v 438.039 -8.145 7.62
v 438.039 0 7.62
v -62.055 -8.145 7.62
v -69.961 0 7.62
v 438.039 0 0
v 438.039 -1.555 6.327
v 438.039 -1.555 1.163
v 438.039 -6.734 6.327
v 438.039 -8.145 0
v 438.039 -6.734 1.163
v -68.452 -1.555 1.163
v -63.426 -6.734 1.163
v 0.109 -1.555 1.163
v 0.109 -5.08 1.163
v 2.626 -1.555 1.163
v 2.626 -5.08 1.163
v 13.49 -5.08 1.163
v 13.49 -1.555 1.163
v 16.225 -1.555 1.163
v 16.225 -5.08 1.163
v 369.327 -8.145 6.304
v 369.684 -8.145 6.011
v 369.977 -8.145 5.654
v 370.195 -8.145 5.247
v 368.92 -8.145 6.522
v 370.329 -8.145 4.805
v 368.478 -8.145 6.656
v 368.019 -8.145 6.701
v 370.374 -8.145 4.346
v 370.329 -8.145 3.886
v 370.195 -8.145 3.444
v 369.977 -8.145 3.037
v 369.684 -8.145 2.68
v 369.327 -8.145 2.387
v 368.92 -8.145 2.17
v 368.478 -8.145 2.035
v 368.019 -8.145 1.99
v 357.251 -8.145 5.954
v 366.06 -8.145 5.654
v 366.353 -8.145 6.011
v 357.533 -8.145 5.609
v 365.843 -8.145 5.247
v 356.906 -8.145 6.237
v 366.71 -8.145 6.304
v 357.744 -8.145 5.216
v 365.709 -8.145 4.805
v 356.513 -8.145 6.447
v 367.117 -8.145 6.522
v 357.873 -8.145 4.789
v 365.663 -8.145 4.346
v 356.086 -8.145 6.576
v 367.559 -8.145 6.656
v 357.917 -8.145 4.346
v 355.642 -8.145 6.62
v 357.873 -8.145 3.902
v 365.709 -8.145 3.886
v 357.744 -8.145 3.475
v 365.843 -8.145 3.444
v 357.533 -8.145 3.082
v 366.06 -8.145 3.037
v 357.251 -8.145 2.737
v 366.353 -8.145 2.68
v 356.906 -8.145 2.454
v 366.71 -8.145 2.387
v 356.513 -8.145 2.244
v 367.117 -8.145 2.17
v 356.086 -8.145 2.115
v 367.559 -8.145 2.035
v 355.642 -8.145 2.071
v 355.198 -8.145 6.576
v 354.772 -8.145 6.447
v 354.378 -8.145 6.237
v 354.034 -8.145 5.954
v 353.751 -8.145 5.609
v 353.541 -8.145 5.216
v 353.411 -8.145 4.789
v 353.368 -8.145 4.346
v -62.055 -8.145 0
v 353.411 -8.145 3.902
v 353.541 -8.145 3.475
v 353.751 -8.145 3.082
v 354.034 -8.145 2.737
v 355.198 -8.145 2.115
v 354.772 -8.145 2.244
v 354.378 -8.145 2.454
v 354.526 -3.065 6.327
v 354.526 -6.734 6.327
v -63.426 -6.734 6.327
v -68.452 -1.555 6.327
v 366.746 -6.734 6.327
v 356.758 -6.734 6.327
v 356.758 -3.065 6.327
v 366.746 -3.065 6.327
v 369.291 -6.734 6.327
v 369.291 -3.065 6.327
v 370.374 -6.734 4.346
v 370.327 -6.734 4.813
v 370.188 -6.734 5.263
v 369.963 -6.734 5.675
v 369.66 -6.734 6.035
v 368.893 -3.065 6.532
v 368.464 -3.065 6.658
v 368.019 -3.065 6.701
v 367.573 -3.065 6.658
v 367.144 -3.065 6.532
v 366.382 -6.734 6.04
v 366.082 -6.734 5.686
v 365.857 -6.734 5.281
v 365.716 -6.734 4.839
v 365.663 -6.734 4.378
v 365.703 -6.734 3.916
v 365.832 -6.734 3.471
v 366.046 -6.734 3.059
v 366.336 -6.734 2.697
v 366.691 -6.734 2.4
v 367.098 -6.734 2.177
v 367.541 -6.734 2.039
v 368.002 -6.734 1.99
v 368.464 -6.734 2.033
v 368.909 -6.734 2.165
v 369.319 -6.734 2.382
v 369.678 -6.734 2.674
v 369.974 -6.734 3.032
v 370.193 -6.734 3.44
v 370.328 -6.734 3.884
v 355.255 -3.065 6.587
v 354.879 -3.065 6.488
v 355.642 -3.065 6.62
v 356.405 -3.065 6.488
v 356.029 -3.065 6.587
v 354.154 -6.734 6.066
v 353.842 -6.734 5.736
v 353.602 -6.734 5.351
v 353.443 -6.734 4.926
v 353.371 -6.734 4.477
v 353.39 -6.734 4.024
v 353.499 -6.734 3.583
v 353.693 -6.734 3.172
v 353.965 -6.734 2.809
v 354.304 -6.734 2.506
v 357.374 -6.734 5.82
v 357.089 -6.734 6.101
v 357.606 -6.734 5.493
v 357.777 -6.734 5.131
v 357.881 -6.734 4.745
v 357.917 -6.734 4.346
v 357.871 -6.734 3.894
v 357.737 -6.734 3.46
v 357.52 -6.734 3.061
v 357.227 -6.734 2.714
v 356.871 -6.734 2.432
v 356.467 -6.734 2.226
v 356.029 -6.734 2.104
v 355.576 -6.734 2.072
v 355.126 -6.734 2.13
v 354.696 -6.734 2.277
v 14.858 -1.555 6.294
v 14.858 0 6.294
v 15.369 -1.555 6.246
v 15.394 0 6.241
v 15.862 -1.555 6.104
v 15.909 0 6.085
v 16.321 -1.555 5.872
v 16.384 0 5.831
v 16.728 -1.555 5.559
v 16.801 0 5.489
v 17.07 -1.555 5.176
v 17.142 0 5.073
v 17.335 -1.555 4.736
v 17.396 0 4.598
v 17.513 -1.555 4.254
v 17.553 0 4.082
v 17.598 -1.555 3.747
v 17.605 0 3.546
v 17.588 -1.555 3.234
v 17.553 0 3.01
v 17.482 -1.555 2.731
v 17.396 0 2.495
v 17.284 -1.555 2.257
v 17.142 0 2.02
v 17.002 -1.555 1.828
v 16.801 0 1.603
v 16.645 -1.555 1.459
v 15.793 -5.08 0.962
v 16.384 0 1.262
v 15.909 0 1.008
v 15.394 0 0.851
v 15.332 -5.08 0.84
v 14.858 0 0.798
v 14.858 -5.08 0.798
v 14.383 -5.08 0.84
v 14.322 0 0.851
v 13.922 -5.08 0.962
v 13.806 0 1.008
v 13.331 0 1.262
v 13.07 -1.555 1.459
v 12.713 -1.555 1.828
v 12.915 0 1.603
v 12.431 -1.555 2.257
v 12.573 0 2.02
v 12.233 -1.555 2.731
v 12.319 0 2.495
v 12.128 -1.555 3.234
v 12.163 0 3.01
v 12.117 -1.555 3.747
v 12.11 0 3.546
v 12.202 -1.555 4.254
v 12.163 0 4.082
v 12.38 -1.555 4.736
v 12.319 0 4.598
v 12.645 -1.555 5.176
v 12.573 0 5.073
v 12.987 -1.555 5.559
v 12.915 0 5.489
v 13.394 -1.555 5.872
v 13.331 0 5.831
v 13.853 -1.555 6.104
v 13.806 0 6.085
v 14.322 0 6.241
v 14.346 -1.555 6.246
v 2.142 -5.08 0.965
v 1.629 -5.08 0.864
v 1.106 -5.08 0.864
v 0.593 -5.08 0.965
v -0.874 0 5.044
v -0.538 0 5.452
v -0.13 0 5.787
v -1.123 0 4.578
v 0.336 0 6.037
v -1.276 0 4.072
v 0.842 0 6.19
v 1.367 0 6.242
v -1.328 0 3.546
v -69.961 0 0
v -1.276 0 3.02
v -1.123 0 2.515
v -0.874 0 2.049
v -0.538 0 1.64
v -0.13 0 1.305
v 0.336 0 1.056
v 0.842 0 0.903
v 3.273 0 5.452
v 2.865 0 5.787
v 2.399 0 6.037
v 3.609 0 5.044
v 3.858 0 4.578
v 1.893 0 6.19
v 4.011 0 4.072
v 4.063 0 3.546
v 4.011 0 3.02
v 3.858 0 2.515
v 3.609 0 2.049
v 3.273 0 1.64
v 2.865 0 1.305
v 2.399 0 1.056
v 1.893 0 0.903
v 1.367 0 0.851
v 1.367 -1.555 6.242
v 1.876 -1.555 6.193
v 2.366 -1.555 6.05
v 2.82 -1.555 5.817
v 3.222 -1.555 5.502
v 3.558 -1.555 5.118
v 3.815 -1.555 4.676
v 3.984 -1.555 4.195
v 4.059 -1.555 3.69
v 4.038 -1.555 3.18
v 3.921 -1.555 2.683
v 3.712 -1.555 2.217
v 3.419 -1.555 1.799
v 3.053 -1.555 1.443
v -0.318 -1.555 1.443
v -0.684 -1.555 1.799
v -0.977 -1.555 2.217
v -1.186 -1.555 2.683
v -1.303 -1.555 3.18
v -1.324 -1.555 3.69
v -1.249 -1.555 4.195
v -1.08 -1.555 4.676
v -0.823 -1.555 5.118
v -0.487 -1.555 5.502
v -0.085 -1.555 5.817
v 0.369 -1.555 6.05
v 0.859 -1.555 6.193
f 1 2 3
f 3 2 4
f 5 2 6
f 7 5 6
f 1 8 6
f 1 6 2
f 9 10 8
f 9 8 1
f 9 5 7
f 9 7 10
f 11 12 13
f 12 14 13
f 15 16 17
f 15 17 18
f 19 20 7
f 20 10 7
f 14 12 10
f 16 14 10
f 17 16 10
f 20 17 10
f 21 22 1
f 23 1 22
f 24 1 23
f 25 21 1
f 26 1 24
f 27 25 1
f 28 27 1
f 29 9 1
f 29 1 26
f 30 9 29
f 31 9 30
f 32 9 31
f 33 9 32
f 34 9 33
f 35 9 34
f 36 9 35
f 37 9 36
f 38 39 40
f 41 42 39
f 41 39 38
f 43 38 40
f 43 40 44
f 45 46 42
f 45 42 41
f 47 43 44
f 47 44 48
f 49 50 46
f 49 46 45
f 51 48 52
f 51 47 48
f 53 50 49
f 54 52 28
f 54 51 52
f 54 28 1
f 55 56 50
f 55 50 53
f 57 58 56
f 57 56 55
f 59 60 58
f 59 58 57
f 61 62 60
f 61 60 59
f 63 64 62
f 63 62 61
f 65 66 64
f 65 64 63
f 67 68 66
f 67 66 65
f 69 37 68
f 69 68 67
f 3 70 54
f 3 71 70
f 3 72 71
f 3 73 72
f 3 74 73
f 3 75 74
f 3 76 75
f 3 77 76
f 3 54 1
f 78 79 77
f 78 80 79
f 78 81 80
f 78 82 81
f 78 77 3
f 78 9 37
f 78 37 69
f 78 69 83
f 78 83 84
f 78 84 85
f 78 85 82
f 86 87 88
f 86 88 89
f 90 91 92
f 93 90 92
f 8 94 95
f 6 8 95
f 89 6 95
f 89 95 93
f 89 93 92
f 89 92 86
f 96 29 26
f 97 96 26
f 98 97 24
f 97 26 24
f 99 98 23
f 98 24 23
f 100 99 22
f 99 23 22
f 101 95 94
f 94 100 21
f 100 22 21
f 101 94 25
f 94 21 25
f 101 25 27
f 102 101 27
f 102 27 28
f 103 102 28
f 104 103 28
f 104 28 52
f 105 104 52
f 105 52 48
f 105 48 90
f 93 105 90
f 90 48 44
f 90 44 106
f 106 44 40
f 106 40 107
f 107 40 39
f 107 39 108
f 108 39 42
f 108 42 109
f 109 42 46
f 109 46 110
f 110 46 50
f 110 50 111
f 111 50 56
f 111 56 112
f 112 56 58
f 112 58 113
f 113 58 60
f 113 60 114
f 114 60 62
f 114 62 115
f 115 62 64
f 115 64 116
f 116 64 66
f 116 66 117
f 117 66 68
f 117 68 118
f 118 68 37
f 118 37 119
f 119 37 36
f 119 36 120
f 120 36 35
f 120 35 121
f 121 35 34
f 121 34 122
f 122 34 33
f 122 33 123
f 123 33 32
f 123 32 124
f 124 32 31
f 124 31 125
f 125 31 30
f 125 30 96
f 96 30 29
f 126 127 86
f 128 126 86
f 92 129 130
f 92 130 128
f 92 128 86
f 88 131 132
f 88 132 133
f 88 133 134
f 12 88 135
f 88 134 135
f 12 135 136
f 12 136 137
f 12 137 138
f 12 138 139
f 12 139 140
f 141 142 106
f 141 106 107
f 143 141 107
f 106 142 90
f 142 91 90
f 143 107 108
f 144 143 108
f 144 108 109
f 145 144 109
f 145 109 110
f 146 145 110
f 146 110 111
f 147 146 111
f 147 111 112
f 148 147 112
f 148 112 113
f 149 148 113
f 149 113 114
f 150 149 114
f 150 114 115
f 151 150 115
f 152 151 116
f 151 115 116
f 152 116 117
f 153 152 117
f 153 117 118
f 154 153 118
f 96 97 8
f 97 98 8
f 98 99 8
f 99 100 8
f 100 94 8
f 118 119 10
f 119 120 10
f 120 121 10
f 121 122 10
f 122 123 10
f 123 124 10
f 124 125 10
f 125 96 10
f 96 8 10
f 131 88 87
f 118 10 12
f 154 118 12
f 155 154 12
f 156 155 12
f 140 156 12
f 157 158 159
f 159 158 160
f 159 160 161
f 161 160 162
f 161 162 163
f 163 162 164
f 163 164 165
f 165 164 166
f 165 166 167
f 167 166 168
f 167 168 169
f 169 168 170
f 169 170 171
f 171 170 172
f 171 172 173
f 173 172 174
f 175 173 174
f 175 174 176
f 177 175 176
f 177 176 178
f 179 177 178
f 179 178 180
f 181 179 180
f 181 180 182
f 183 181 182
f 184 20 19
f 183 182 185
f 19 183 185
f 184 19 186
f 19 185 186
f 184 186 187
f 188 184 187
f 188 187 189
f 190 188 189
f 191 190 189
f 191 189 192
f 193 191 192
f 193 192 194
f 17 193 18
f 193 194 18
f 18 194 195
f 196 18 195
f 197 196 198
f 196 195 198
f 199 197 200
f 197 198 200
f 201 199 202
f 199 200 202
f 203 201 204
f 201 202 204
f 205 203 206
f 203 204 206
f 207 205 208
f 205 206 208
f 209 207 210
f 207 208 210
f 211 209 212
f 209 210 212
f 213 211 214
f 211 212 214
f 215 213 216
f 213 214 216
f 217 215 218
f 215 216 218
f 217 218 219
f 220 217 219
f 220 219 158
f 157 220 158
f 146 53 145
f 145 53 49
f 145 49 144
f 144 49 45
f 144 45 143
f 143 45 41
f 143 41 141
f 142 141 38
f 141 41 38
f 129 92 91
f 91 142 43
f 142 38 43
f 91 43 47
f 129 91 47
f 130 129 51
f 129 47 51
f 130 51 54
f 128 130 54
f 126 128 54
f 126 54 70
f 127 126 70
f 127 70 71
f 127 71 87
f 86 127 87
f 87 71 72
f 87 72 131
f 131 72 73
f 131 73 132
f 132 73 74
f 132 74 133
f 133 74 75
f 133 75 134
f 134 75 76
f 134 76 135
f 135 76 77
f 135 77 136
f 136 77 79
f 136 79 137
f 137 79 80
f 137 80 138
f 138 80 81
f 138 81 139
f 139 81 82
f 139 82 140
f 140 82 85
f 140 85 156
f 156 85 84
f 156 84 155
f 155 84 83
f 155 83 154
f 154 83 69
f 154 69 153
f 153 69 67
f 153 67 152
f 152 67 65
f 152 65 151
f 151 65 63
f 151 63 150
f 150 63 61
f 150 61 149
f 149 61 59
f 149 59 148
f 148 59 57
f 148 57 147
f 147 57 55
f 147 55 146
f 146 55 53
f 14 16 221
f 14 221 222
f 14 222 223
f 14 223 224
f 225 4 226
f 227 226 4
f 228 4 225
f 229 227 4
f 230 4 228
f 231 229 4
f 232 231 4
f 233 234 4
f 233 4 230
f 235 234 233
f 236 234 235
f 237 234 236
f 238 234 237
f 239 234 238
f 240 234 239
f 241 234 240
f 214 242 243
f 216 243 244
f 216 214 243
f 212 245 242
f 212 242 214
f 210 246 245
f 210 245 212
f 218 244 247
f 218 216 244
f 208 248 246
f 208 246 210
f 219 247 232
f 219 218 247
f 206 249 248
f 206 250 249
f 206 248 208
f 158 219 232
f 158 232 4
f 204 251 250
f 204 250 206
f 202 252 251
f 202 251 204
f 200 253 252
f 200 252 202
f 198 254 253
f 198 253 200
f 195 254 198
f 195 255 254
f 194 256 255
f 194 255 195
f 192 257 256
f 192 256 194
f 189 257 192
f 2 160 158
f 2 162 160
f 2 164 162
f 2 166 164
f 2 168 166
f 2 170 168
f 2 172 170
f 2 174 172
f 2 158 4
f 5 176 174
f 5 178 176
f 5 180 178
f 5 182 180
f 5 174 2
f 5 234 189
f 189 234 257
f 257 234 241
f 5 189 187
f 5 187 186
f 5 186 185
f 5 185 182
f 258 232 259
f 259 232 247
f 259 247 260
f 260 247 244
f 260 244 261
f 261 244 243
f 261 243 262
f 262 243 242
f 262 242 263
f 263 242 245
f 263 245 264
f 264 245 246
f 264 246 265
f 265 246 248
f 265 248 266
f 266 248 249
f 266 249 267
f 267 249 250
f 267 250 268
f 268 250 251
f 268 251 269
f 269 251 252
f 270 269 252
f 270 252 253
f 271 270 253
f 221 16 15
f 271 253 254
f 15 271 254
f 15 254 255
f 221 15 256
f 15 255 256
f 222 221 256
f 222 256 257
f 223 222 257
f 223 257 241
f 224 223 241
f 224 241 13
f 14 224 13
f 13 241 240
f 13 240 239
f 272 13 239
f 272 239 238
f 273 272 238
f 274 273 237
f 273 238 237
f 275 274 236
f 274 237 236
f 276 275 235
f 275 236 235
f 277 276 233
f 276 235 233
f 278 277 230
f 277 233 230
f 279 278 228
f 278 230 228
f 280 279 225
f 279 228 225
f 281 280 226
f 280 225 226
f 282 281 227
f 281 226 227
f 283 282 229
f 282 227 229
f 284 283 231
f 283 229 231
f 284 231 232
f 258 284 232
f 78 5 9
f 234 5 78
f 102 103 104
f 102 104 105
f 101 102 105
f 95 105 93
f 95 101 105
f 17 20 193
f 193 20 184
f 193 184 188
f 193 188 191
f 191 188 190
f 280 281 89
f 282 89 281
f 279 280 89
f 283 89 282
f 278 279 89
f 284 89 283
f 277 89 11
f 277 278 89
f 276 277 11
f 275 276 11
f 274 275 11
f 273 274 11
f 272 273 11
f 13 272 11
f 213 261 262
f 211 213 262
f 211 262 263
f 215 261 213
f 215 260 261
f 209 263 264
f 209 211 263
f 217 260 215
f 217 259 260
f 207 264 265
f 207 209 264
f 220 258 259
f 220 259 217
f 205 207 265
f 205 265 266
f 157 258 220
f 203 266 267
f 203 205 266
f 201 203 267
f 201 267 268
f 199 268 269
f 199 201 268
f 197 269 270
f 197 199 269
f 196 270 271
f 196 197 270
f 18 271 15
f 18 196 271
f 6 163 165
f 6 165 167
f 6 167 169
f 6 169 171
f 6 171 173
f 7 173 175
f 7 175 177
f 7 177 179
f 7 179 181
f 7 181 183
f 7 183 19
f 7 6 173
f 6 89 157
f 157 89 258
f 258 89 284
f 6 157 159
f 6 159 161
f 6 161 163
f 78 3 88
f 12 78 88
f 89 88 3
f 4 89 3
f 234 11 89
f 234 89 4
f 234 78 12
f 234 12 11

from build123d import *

# Parameters (mm, degrees)
BOSS_EXTRUDE1_DEPTH = 7.62
SKETCH3_W           = 5.16456173
SKETCH3_H           = 5.178482382
CUT_EXTRUDE2_DEPTH  = 509.122439065
SKETCH4_R           = 2.695407271
SKETCH4_R_2         = 2.747845639
CUT_EXTRUDE3_DEPTH  = 5.08
SKETCH5_R           = 2.274624141
SKETCH5_R_2         = 2.355331531
CUT_EXTRUDE4_DEPTH  = 5.08


with BuildPart() as part:
    # Sketch1 → Boss-Extrude1 (new body)
    with BuildSketch(Plane.XY):
        Polygon((-69.961161881, 0), (438.038838119, 0), (438.038838119, -8.14546996), (-62.055264567, -8.14546996), align=None)
    extrude(amount=BOSS_EXTRUDE1_DEPTH)

    # Sketch3 → Cut-Extrude2 (cut, through all)
    with BuildSketch(Plane(origin=(438.038838119, 0, 0), x_dir=(0, 0, -1), z_dir=(1, 0, 0))):
        with Locations((-3.745160102, -4.144469612)):
            Rectangle(SKETCH3_W, SKETCH3_H)
    extrude(amount=-CUT_EXTRUDE2_DEPTH, mode=Mode.SUBTRACT)

    # Sketch4 → Cut-Extrude3 (cut)
    with BuildSketch(Plane(origin=(0, 0, 0), x_dir=(1, 0, 0), z_dir=(0, 1, 0))):
        with Locations(Location((1.367483079, -3.546323854, 0), (0, 0, 270))):
            Circle(SKETCH4_R)
        with Locations(Location((14.857584748, -3.546323854, 0), (0, 0, 270))):
            Circle(SKETCH4_R_2)
    extrude(amount=-CUT_EXTRUDE3_DEPTH, mode=Mode.SUBTRACT)

    # Sketch5 → Cut-Extrude4 (cut)
    with BuildSketch(Plane.XZ.offset(8.14546996)):
        with Locations((355.642137029, 4.345547061)):
            Circle(SKETCH5_R)
        with Locations((368.018591587, 4.345547061)):
            Circle(SKETCH5_R_2)
    extrude(amount=-CUT_EXTRUDE4_DEPTH, mode=Mode.SUBTRACT)


solid = part.part
